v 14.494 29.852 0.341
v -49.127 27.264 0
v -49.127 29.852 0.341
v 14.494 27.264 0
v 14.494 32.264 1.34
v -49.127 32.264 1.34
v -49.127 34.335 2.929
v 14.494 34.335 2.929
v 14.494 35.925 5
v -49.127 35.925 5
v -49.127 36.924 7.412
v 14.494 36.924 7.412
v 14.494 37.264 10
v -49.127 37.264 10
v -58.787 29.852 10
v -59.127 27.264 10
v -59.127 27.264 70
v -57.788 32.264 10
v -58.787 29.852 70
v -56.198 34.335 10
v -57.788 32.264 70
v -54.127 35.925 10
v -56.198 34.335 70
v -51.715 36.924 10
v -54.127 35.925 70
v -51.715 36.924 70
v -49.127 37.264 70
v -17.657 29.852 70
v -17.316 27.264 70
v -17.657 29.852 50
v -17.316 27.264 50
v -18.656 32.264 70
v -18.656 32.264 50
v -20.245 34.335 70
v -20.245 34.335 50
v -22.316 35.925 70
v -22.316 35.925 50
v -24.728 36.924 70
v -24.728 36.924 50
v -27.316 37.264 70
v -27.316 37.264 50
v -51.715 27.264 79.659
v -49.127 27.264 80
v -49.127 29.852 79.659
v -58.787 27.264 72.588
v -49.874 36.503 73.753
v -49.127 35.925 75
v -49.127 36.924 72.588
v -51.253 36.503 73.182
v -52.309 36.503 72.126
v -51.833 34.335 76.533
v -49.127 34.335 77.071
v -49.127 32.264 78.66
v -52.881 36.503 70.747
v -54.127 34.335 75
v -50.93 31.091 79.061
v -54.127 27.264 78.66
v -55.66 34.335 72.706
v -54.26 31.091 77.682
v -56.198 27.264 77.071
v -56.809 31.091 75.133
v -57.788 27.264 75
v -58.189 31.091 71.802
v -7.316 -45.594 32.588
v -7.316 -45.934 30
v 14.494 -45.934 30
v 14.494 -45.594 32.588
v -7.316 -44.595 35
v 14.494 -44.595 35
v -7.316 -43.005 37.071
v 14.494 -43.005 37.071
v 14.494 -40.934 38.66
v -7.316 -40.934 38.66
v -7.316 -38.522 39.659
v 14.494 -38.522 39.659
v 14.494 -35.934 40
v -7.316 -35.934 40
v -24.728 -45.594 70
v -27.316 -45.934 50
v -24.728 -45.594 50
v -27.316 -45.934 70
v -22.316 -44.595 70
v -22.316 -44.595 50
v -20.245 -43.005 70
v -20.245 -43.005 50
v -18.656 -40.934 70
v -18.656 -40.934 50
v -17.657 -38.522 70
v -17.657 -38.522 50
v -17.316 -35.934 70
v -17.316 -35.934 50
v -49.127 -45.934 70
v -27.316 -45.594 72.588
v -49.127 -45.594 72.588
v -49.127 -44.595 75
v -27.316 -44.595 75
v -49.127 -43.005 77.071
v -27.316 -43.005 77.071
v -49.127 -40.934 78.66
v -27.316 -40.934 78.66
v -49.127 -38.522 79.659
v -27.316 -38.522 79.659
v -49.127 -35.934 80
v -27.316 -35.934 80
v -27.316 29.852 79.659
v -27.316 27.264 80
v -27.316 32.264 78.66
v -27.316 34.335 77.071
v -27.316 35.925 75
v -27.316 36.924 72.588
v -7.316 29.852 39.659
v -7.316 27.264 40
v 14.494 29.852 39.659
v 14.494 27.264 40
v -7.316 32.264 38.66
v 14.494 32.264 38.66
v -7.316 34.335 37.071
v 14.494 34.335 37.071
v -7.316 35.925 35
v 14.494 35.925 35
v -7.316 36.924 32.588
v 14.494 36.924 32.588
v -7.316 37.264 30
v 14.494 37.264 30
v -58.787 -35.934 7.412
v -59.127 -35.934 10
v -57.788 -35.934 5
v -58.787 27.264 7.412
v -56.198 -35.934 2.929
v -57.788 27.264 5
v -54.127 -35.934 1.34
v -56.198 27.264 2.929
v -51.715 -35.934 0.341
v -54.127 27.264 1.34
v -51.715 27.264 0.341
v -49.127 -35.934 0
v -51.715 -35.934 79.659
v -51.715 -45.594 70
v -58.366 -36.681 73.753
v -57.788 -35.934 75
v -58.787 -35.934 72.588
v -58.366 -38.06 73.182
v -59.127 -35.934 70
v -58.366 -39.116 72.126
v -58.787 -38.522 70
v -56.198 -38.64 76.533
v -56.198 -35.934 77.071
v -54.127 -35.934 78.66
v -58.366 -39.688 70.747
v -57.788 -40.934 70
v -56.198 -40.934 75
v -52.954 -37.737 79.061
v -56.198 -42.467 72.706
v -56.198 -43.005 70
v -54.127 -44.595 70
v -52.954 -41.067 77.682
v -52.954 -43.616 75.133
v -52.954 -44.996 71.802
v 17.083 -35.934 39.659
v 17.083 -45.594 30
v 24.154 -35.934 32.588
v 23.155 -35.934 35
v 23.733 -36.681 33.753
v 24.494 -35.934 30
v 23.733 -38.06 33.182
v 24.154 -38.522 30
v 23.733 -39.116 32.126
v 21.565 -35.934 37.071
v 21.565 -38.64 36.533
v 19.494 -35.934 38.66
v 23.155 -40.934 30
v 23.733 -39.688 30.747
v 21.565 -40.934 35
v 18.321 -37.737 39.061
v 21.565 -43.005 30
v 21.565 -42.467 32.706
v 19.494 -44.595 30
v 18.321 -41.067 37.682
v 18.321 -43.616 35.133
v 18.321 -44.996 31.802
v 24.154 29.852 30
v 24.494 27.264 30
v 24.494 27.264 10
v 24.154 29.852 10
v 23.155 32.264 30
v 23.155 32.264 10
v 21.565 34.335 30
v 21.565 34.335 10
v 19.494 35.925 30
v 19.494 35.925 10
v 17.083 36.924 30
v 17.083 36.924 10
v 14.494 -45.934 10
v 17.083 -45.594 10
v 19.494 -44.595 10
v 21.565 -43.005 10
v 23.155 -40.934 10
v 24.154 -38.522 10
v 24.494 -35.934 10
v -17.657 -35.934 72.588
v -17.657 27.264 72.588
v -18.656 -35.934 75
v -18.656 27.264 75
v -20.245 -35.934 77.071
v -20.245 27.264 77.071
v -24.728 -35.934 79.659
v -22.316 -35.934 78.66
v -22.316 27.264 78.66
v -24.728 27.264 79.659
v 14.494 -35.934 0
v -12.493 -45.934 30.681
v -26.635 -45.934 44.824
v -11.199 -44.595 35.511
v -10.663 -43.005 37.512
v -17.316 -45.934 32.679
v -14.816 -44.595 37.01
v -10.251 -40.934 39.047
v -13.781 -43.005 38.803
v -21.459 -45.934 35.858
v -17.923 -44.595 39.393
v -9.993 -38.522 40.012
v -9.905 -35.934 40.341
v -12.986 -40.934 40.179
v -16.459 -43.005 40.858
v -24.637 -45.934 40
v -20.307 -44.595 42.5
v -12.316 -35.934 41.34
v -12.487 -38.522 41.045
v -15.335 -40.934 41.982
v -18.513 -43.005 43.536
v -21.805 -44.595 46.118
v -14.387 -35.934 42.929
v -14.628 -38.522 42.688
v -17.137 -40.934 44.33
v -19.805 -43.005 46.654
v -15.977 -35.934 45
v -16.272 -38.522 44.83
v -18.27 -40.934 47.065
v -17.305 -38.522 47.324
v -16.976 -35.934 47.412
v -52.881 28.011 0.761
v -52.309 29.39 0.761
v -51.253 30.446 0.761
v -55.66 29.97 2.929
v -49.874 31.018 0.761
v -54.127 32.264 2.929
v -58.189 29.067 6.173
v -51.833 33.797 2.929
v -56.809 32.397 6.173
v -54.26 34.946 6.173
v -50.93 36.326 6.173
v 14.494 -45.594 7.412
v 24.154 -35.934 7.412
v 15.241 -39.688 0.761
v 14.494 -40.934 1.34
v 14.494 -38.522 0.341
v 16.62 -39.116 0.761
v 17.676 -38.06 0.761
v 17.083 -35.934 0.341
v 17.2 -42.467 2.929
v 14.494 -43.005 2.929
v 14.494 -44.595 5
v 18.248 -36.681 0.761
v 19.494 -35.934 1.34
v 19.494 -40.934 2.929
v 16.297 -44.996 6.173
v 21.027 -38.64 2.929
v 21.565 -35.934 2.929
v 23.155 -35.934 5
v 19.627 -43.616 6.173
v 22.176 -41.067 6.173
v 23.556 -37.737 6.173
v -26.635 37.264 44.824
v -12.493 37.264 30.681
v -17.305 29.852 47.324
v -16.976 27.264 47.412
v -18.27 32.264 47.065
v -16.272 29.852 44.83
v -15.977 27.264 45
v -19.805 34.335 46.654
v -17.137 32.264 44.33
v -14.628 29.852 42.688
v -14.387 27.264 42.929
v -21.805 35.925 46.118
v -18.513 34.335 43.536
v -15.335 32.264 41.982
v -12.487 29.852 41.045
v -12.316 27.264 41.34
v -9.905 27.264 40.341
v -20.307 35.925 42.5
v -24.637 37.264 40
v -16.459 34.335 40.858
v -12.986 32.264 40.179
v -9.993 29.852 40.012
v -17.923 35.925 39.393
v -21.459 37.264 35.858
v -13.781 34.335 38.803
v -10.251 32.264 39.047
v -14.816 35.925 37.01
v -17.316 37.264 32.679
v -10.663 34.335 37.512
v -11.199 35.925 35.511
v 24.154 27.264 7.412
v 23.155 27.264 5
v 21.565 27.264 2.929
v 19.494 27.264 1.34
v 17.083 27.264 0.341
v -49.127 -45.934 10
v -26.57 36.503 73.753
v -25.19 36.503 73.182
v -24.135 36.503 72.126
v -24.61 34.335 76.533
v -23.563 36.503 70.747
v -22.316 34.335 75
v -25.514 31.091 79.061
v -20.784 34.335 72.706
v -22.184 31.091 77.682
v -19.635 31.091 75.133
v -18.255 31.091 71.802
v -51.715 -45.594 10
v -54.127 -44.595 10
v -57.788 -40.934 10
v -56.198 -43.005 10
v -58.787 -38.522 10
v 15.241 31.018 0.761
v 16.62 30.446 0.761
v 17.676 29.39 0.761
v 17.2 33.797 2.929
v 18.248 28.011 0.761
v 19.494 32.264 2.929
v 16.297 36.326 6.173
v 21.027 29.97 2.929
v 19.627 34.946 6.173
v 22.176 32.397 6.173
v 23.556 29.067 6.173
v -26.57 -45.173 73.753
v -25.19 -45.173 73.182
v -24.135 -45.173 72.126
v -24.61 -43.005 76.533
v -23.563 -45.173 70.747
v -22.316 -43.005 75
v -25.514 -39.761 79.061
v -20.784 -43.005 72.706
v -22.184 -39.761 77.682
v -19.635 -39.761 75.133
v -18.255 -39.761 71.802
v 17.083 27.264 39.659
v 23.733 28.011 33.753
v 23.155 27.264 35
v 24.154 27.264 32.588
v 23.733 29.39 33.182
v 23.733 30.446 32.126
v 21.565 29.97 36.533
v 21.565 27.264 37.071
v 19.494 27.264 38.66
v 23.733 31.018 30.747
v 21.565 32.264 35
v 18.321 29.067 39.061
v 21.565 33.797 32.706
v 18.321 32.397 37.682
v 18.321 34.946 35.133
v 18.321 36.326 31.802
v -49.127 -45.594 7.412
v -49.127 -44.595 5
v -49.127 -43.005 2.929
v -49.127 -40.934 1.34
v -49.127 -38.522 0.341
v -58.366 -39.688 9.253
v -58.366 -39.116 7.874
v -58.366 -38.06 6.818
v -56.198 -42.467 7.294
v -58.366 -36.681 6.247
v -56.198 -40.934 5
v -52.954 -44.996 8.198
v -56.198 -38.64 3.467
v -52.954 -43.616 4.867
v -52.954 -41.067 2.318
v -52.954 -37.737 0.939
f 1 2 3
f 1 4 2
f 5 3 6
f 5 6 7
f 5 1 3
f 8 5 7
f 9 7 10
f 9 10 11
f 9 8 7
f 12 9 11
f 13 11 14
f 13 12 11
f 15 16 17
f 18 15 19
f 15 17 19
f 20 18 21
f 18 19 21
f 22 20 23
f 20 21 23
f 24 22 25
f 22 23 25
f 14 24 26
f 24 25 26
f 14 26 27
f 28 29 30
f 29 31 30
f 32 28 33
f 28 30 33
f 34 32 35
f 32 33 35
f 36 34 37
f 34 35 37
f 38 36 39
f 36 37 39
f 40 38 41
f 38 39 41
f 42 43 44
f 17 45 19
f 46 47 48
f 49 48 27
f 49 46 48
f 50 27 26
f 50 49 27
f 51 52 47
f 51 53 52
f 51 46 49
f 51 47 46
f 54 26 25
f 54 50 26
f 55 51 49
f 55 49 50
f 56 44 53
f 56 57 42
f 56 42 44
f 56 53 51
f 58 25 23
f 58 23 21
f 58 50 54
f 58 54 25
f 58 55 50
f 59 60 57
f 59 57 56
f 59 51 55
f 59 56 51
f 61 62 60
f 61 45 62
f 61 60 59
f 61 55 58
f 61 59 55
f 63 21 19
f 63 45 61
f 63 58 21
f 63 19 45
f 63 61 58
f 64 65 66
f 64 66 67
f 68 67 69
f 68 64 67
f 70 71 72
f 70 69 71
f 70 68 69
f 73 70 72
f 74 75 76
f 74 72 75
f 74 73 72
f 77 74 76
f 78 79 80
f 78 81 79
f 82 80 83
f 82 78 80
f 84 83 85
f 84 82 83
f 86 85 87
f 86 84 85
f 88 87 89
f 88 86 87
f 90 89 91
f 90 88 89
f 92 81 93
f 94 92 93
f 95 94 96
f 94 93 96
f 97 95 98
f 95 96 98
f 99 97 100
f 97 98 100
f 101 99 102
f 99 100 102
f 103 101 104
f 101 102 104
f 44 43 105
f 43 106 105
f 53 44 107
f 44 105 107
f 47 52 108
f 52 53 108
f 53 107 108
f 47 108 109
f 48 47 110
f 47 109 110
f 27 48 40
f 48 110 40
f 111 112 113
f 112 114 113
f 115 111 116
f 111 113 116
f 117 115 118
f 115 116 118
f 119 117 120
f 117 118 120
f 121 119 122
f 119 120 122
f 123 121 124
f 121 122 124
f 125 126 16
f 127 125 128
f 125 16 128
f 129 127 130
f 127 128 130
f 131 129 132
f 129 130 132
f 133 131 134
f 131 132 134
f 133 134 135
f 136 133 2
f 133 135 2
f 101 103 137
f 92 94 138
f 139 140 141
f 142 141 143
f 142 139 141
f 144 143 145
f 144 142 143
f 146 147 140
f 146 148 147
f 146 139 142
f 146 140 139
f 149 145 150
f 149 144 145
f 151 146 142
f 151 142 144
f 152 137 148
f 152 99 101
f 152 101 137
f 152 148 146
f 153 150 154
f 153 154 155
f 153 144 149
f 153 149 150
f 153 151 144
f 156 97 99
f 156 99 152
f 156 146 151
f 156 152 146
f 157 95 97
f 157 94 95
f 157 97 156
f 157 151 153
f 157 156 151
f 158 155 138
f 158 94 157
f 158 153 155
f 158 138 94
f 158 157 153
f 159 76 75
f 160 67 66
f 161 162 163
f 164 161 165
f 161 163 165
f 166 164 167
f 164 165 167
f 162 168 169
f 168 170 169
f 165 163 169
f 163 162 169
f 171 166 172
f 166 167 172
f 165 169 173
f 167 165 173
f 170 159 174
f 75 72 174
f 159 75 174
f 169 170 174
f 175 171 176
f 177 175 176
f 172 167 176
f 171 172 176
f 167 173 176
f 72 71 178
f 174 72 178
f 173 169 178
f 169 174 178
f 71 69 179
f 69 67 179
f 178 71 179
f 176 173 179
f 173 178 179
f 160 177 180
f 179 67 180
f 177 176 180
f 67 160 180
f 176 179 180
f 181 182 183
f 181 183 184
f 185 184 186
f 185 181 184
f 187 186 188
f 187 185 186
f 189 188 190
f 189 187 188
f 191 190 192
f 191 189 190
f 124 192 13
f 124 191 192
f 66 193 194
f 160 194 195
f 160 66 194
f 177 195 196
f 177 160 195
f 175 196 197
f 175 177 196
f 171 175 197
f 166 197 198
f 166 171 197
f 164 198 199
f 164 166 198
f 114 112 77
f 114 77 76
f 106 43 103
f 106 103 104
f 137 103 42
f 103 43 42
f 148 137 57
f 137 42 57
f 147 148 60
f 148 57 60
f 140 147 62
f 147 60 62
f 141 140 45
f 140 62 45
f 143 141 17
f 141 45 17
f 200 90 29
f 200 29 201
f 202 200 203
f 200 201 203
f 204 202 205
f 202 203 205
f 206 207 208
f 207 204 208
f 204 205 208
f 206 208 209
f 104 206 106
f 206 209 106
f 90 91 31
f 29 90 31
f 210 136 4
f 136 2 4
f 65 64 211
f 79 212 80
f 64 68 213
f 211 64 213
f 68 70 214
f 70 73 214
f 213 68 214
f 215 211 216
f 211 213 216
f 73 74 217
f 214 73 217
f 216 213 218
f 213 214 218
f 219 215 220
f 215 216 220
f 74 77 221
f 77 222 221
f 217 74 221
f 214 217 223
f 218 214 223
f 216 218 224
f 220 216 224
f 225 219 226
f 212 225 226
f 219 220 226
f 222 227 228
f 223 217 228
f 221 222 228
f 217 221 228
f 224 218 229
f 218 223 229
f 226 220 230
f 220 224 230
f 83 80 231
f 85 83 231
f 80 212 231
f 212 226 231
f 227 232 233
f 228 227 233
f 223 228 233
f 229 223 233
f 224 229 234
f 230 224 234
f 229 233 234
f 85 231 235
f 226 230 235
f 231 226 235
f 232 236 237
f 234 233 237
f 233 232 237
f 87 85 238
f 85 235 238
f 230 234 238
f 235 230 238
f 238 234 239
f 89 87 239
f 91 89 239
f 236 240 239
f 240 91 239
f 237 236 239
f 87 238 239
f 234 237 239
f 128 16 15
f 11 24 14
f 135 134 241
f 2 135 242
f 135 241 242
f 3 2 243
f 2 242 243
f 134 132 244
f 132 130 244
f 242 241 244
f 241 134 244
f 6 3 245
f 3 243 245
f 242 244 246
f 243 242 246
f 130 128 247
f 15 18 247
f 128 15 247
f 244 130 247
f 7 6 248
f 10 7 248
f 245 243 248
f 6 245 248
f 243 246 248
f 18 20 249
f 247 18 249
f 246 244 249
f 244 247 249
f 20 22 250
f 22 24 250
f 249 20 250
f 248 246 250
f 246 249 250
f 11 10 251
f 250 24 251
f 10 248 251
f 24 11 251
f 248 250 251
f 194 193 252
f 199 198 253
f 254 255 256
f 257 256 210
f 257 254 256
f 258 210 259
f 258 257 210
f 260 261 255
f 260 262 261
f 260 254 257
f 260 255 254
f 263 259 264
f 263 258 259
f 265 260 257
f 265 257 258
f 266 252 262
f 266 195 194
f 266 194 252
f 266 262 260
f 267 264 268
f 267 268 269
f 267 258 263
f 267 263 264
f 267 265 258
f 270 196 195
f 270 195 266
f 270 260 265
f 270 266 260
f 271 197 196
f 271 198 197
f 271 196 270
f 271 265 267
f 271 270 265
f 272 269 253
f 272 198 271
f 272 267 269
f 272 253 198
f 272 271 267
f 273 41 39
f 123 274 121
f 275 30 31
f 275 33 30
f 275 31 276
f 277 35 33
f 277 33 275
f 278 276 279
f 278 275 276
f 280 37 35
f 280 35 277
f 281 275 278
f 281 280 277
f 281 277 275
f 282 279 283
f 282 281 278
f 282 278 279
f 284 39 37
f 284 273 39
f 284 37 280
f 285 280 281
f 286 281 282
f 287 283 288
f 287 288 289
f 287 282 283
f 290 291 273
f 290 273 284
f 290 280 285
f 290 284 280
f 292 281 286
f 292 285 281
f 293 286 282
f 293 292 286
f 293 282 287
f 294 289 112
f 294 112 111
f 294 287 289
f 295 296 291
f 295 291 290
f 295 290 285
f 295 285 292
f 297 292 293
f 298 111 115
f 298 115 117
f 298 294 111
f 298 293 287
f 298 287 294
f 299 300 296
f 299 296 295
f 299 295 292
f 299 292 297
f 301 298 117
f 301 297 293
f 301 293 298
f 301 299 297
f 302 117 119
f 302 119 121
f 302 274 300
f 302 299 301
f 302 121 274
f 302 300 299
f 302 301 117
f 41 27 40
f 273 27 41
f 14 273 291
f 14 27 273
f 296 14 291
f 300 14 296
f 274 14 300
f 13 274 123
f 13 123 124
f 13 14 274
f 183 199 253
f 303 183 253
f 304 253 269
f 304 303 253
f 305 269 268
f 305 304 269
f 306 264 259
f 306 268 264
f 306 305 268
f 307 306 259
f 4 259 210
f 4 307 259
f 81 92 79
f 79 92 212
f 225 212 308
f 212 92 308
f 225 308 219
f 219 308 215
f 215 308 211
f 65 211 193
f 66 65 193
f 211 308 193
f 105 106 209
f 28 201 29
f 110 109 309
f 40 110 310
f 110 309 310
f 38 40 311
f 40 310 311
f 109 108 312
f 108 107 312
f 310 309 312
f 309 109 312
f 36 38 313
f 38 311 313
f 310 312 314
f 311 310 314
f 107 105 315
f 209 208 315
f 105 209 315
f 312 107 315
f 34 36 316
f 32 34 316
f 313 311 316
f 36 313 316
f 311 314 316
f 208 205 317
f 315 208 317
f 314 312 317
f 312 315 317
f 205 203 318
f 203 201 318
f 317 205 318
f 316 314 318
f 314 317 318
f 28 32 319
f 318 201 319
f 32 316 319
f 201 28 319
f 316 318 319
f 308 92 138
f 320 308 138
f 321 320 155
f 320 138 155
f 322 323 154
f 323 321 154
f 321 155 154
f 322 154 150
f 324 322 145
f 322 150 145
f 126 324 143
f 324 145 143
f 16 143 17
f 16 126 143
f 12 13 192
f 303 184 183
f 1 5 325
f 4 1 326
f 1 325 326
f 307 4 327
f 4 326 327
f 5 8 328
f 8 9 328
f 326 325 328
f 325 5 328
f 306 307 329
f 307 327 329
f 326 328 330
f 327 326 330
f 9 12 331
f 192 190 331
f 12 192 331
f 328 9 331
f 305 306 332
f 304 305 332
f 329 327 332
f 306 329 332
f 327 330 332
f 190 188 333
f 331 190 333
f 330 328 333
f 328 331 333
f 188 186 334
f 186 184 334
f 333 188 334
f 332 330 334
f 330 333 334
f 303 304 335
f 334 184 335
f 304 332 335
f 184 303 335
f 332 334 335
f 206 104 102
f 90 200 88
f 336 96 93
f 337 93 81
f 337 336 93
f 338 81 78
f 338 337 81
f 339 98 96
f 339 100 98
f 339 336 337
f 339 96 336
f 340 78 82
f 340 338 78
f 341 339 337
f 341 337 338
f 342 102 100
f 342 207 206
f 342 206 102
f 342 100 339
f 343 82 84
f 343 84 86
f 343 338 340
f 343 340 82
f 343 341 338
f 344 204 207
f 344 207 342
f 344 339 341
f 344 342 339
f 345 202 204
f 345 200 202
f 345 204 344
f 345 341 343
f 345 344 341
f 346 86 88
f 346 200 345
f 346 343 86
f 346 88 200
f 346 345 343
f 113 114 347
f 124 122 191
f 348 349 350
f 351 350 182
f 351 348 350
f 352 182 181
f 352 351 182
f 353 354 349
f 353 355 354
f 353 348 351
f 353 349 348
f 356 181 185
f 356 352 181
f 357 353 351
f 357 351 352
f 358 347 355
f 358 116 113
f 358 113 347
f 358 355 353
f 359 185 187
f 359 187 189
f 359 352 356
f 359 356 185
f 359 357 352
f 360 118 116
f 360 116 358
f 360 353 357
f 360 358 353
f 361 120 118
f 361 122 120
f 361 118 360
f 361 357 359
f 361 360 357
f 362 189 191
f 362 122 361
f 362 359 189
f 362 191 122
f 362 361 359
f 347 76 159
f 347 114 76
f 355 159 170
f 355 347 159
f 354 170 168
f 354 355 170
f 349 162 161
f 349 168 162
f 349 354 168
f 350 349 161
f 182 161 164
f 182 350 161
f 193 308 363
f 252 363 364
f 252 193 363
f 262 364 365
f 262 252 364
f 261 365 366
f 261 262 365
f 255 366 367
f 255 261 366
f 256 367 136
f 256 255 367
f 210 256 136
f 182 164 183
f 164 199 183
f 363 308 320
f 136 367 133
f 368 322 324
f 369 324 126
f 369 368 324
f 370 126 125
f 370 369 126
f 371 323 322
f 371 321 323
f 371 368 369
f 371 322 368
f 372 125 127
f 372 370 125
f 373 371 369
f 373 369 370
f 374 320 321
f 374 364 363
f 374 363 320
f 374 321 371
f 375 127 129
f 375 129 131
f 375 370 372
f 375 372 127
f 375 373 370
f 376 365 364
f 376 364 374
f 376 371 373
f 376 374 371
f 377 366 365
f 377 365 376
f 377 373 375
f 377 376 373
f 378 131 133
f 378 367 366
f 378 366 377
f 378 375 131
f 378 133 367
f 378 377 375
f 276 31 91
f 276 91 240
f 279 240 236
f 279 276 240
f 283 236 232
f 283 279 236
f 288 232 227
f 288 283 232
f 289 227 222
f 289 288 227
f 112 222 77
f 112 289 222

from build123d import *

# Parameters (mm, degrees)
F0_W     = 83.6216490716
F0_H     = 83.1985995173
F1_DEPTH = 40
F2_W     = 41.8108245358
F2_H     = 83.1985995173
F3_DEPTH = 40
F4_F1_R  = 10
F4_F2_R  = 10


with BuildPart() as f1:
    # F0 (on Top) → F1 (new body)
    with BuildSketch(Plane.XY):
        with Locations((-17.3164242879, -4.335001111)):
            Rectangle(F0_W, F0_H)
    extrude(amount=F1_DEPTH)

    # F2 (on face) → F3 (join)
    with BuildSketch(Plane.XY.offset(40)):
        with Locations((-38.2218365557, -4.335001111)):
            Rectangle(F2_W, F2_H)
    extrude(amount=F3_DEPTH)

    # F4: fillet of radius 10 on 16 edges, made by hand

    # F4_f1
    f4_f1_edges = [f1.edges().sort_by_distance(p)[0] for p in [
        (-17.3164242879, -4.335001111, 40),
    ]]
    fillet(f4_f1_edges, radius=F4_F1_R)

    # F4_f2
    f4_f2_edges = [f1.edges().sort_by_distance(p)[0] for p in [
        (-17.3164242879, -4.335001111, 80),
        (-38.2218365557, -45.9343008697, 80),
        (-17.3164242879, -45.9343008697, 65),
        (-59.1272488236, -4.335001111, 80),
        (-38.2218365557, 37.2642986476, 80),
        (8.58898798, 37.2642986476, 40),
        (24.4944002479, -4.335001111, 40),
        (24.4944002479, -45.9343008697, 20),
        (24.4944002479, 37.2642986476, 20),
        (-17.3164242879, -45.9343008697, 0),
        (-59.1272488236, -45.9343008697, 40),
        (-59.1272488236, 37.2642986476, 40),
        (-59.1272488236, -4.335001111, 0),
        (-17.3164242879, 37.2642986476, 0),
        (24.4944002479, -4.335001111, 0),
        (-14.3874920997, 37.2642986476, 42.9289321881),
        (-14.3874920997, -45.9343008697, 42.9289321881),
    ]]
    fillet(f4_f2_edges, radius=F4_F2_R)


solid = f1.part
